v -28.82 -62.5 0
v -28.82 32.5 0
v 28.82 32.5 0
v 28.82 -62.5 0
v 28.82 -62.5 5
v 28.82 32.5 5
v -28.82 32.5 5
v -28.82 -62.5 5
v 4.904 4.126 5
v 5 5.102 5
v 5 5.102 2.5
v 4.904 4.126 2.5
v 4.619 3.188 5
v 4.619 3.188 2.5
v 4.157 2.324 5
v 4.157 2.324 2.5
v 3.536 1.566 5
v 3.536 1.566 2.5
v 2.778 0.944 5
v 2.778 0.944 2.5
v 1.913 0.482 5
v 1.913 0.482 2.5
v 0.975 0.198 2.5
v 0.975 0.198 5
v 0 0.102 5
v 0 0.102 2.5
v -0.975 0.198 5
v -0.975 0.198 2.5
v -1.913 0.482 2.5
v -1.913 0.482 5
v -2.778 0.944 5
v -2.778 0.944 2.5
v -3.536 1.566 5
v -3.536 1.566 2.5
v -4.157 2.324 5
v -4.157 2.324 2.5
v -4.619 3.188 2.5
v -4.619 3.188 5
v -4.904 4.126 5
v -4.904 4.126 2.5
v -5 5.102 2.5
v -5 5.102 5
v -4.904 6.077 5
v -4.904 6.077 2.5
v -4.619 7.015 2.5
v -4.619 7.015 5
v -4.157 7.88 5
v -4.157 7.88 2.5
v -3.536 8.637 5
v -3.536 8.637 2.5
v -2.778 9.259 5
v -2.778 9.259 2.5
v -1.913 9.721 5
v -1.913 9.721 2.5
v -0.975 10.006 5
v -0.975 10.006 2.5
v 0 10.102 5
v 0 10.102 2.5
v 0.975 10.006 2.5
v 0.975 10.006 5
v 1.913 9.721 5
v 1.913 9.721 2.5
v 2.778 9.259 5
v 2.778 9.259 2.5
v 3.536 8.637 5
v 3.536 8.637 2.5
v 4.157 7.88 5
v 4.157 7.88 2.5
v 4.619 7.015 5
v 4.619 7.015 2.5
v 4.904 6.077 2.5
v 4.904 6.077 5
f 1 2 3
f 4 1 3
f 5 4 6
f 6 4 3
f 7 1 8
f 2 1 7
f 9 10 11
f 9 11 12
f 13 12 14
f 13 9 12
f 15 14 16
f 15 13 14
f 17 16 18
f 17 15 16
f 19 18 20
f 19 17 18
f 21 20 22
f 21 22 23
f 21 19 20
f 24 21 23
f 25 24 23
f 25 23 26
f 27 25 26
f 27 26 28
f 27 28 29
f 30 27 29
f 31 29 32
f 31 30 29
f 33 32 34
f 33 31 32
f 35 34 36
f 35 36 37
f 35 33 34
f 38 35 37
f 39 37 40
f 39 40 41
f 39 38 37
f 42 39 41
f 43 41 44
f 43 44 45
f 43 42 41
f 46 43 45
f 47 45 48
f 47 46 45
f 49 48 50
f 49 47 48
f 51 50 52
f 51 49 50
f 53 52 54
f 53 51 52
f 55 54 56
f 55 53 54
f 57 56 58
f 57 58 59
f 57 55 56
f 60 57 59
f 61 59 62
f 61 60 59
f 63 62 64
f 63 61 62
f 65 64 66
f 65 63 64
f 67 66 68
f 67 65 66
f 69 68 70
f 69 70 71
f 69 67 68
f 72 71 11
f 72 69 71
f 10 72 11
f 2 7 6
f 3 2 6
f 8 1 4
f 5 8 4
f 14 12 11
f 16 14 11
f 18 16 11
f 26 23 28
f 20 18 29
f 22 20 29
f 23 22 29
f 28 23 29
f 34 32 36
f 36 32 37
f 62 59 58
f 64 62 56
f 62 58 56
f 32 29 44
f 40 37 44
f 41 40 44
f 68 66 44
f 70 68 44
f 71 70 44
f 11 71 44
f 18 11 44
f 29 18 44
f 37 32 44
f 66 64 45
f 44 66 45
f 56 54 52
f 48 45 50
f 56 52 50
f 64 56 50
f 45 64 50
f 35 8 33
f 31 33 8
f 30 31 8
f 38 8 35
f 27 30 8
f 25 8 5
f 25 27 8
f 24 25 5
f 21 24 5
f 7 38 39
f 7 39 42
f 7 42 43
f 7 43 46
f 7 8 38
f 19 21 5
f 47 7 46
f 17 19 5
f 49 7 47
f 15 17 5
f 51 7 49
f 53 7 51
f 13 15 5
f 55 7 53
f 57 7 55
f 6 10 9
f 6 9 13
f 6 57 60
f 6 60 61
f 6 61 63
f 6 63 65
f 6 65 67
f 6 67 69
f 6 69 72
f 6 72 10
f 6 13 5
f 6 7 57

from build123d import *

# Parameters (mm, degrees)
SKETCH_1_W          = 57.64
SKETCH_1_H          = 125
EXTRUDE_1_DEPTH     = 5
CUT_EXTRUDE_1_DEPTH = 2.5
SKETCH_3_W          = 57.64
SKETCH_3_H          = 30
CUT_EXTRUDE_2_DEPTH = 10


with BuildPart() as part:
    # 스케치1 → 보스-돌출1 (new body)
    with BuildSketch(Plane.XY):
        Rectangle(SKETCH_1_W, SKETCH_1_H)
    extrude(amount=EXTRUDE_1_DEPTH)

    # 스케치2 → 컷-돌출1 (cut)
    with BuildSketch(Plane.XY.offset(5)):
        with BuildLine():
            ThreePointArc((-5, 5.10170356), (0, 10.10170356), (5, 5.10170356))
            ThreePointArc((5, 5.10170356), (0, 0.10170356), (-5, 5.10170356))
        make_face()
    extrude(amount=-CUT_EXTRUDE_1_DEPTH, mode=Mode.SUBTRACT)

    # 스케치3 → 컷-돌출2 (cut)
    with BuildSketch(Plane.XY.offset(5)):
        with Locations((0, 47.5)):
            Rectangle(SKETCH_3_W, SKETCH_3_H)
    extrude(amount=-CUT_EXTRUDE_2_DEPTH, mode=Mode.SUBTRACT)


solid = part.part
